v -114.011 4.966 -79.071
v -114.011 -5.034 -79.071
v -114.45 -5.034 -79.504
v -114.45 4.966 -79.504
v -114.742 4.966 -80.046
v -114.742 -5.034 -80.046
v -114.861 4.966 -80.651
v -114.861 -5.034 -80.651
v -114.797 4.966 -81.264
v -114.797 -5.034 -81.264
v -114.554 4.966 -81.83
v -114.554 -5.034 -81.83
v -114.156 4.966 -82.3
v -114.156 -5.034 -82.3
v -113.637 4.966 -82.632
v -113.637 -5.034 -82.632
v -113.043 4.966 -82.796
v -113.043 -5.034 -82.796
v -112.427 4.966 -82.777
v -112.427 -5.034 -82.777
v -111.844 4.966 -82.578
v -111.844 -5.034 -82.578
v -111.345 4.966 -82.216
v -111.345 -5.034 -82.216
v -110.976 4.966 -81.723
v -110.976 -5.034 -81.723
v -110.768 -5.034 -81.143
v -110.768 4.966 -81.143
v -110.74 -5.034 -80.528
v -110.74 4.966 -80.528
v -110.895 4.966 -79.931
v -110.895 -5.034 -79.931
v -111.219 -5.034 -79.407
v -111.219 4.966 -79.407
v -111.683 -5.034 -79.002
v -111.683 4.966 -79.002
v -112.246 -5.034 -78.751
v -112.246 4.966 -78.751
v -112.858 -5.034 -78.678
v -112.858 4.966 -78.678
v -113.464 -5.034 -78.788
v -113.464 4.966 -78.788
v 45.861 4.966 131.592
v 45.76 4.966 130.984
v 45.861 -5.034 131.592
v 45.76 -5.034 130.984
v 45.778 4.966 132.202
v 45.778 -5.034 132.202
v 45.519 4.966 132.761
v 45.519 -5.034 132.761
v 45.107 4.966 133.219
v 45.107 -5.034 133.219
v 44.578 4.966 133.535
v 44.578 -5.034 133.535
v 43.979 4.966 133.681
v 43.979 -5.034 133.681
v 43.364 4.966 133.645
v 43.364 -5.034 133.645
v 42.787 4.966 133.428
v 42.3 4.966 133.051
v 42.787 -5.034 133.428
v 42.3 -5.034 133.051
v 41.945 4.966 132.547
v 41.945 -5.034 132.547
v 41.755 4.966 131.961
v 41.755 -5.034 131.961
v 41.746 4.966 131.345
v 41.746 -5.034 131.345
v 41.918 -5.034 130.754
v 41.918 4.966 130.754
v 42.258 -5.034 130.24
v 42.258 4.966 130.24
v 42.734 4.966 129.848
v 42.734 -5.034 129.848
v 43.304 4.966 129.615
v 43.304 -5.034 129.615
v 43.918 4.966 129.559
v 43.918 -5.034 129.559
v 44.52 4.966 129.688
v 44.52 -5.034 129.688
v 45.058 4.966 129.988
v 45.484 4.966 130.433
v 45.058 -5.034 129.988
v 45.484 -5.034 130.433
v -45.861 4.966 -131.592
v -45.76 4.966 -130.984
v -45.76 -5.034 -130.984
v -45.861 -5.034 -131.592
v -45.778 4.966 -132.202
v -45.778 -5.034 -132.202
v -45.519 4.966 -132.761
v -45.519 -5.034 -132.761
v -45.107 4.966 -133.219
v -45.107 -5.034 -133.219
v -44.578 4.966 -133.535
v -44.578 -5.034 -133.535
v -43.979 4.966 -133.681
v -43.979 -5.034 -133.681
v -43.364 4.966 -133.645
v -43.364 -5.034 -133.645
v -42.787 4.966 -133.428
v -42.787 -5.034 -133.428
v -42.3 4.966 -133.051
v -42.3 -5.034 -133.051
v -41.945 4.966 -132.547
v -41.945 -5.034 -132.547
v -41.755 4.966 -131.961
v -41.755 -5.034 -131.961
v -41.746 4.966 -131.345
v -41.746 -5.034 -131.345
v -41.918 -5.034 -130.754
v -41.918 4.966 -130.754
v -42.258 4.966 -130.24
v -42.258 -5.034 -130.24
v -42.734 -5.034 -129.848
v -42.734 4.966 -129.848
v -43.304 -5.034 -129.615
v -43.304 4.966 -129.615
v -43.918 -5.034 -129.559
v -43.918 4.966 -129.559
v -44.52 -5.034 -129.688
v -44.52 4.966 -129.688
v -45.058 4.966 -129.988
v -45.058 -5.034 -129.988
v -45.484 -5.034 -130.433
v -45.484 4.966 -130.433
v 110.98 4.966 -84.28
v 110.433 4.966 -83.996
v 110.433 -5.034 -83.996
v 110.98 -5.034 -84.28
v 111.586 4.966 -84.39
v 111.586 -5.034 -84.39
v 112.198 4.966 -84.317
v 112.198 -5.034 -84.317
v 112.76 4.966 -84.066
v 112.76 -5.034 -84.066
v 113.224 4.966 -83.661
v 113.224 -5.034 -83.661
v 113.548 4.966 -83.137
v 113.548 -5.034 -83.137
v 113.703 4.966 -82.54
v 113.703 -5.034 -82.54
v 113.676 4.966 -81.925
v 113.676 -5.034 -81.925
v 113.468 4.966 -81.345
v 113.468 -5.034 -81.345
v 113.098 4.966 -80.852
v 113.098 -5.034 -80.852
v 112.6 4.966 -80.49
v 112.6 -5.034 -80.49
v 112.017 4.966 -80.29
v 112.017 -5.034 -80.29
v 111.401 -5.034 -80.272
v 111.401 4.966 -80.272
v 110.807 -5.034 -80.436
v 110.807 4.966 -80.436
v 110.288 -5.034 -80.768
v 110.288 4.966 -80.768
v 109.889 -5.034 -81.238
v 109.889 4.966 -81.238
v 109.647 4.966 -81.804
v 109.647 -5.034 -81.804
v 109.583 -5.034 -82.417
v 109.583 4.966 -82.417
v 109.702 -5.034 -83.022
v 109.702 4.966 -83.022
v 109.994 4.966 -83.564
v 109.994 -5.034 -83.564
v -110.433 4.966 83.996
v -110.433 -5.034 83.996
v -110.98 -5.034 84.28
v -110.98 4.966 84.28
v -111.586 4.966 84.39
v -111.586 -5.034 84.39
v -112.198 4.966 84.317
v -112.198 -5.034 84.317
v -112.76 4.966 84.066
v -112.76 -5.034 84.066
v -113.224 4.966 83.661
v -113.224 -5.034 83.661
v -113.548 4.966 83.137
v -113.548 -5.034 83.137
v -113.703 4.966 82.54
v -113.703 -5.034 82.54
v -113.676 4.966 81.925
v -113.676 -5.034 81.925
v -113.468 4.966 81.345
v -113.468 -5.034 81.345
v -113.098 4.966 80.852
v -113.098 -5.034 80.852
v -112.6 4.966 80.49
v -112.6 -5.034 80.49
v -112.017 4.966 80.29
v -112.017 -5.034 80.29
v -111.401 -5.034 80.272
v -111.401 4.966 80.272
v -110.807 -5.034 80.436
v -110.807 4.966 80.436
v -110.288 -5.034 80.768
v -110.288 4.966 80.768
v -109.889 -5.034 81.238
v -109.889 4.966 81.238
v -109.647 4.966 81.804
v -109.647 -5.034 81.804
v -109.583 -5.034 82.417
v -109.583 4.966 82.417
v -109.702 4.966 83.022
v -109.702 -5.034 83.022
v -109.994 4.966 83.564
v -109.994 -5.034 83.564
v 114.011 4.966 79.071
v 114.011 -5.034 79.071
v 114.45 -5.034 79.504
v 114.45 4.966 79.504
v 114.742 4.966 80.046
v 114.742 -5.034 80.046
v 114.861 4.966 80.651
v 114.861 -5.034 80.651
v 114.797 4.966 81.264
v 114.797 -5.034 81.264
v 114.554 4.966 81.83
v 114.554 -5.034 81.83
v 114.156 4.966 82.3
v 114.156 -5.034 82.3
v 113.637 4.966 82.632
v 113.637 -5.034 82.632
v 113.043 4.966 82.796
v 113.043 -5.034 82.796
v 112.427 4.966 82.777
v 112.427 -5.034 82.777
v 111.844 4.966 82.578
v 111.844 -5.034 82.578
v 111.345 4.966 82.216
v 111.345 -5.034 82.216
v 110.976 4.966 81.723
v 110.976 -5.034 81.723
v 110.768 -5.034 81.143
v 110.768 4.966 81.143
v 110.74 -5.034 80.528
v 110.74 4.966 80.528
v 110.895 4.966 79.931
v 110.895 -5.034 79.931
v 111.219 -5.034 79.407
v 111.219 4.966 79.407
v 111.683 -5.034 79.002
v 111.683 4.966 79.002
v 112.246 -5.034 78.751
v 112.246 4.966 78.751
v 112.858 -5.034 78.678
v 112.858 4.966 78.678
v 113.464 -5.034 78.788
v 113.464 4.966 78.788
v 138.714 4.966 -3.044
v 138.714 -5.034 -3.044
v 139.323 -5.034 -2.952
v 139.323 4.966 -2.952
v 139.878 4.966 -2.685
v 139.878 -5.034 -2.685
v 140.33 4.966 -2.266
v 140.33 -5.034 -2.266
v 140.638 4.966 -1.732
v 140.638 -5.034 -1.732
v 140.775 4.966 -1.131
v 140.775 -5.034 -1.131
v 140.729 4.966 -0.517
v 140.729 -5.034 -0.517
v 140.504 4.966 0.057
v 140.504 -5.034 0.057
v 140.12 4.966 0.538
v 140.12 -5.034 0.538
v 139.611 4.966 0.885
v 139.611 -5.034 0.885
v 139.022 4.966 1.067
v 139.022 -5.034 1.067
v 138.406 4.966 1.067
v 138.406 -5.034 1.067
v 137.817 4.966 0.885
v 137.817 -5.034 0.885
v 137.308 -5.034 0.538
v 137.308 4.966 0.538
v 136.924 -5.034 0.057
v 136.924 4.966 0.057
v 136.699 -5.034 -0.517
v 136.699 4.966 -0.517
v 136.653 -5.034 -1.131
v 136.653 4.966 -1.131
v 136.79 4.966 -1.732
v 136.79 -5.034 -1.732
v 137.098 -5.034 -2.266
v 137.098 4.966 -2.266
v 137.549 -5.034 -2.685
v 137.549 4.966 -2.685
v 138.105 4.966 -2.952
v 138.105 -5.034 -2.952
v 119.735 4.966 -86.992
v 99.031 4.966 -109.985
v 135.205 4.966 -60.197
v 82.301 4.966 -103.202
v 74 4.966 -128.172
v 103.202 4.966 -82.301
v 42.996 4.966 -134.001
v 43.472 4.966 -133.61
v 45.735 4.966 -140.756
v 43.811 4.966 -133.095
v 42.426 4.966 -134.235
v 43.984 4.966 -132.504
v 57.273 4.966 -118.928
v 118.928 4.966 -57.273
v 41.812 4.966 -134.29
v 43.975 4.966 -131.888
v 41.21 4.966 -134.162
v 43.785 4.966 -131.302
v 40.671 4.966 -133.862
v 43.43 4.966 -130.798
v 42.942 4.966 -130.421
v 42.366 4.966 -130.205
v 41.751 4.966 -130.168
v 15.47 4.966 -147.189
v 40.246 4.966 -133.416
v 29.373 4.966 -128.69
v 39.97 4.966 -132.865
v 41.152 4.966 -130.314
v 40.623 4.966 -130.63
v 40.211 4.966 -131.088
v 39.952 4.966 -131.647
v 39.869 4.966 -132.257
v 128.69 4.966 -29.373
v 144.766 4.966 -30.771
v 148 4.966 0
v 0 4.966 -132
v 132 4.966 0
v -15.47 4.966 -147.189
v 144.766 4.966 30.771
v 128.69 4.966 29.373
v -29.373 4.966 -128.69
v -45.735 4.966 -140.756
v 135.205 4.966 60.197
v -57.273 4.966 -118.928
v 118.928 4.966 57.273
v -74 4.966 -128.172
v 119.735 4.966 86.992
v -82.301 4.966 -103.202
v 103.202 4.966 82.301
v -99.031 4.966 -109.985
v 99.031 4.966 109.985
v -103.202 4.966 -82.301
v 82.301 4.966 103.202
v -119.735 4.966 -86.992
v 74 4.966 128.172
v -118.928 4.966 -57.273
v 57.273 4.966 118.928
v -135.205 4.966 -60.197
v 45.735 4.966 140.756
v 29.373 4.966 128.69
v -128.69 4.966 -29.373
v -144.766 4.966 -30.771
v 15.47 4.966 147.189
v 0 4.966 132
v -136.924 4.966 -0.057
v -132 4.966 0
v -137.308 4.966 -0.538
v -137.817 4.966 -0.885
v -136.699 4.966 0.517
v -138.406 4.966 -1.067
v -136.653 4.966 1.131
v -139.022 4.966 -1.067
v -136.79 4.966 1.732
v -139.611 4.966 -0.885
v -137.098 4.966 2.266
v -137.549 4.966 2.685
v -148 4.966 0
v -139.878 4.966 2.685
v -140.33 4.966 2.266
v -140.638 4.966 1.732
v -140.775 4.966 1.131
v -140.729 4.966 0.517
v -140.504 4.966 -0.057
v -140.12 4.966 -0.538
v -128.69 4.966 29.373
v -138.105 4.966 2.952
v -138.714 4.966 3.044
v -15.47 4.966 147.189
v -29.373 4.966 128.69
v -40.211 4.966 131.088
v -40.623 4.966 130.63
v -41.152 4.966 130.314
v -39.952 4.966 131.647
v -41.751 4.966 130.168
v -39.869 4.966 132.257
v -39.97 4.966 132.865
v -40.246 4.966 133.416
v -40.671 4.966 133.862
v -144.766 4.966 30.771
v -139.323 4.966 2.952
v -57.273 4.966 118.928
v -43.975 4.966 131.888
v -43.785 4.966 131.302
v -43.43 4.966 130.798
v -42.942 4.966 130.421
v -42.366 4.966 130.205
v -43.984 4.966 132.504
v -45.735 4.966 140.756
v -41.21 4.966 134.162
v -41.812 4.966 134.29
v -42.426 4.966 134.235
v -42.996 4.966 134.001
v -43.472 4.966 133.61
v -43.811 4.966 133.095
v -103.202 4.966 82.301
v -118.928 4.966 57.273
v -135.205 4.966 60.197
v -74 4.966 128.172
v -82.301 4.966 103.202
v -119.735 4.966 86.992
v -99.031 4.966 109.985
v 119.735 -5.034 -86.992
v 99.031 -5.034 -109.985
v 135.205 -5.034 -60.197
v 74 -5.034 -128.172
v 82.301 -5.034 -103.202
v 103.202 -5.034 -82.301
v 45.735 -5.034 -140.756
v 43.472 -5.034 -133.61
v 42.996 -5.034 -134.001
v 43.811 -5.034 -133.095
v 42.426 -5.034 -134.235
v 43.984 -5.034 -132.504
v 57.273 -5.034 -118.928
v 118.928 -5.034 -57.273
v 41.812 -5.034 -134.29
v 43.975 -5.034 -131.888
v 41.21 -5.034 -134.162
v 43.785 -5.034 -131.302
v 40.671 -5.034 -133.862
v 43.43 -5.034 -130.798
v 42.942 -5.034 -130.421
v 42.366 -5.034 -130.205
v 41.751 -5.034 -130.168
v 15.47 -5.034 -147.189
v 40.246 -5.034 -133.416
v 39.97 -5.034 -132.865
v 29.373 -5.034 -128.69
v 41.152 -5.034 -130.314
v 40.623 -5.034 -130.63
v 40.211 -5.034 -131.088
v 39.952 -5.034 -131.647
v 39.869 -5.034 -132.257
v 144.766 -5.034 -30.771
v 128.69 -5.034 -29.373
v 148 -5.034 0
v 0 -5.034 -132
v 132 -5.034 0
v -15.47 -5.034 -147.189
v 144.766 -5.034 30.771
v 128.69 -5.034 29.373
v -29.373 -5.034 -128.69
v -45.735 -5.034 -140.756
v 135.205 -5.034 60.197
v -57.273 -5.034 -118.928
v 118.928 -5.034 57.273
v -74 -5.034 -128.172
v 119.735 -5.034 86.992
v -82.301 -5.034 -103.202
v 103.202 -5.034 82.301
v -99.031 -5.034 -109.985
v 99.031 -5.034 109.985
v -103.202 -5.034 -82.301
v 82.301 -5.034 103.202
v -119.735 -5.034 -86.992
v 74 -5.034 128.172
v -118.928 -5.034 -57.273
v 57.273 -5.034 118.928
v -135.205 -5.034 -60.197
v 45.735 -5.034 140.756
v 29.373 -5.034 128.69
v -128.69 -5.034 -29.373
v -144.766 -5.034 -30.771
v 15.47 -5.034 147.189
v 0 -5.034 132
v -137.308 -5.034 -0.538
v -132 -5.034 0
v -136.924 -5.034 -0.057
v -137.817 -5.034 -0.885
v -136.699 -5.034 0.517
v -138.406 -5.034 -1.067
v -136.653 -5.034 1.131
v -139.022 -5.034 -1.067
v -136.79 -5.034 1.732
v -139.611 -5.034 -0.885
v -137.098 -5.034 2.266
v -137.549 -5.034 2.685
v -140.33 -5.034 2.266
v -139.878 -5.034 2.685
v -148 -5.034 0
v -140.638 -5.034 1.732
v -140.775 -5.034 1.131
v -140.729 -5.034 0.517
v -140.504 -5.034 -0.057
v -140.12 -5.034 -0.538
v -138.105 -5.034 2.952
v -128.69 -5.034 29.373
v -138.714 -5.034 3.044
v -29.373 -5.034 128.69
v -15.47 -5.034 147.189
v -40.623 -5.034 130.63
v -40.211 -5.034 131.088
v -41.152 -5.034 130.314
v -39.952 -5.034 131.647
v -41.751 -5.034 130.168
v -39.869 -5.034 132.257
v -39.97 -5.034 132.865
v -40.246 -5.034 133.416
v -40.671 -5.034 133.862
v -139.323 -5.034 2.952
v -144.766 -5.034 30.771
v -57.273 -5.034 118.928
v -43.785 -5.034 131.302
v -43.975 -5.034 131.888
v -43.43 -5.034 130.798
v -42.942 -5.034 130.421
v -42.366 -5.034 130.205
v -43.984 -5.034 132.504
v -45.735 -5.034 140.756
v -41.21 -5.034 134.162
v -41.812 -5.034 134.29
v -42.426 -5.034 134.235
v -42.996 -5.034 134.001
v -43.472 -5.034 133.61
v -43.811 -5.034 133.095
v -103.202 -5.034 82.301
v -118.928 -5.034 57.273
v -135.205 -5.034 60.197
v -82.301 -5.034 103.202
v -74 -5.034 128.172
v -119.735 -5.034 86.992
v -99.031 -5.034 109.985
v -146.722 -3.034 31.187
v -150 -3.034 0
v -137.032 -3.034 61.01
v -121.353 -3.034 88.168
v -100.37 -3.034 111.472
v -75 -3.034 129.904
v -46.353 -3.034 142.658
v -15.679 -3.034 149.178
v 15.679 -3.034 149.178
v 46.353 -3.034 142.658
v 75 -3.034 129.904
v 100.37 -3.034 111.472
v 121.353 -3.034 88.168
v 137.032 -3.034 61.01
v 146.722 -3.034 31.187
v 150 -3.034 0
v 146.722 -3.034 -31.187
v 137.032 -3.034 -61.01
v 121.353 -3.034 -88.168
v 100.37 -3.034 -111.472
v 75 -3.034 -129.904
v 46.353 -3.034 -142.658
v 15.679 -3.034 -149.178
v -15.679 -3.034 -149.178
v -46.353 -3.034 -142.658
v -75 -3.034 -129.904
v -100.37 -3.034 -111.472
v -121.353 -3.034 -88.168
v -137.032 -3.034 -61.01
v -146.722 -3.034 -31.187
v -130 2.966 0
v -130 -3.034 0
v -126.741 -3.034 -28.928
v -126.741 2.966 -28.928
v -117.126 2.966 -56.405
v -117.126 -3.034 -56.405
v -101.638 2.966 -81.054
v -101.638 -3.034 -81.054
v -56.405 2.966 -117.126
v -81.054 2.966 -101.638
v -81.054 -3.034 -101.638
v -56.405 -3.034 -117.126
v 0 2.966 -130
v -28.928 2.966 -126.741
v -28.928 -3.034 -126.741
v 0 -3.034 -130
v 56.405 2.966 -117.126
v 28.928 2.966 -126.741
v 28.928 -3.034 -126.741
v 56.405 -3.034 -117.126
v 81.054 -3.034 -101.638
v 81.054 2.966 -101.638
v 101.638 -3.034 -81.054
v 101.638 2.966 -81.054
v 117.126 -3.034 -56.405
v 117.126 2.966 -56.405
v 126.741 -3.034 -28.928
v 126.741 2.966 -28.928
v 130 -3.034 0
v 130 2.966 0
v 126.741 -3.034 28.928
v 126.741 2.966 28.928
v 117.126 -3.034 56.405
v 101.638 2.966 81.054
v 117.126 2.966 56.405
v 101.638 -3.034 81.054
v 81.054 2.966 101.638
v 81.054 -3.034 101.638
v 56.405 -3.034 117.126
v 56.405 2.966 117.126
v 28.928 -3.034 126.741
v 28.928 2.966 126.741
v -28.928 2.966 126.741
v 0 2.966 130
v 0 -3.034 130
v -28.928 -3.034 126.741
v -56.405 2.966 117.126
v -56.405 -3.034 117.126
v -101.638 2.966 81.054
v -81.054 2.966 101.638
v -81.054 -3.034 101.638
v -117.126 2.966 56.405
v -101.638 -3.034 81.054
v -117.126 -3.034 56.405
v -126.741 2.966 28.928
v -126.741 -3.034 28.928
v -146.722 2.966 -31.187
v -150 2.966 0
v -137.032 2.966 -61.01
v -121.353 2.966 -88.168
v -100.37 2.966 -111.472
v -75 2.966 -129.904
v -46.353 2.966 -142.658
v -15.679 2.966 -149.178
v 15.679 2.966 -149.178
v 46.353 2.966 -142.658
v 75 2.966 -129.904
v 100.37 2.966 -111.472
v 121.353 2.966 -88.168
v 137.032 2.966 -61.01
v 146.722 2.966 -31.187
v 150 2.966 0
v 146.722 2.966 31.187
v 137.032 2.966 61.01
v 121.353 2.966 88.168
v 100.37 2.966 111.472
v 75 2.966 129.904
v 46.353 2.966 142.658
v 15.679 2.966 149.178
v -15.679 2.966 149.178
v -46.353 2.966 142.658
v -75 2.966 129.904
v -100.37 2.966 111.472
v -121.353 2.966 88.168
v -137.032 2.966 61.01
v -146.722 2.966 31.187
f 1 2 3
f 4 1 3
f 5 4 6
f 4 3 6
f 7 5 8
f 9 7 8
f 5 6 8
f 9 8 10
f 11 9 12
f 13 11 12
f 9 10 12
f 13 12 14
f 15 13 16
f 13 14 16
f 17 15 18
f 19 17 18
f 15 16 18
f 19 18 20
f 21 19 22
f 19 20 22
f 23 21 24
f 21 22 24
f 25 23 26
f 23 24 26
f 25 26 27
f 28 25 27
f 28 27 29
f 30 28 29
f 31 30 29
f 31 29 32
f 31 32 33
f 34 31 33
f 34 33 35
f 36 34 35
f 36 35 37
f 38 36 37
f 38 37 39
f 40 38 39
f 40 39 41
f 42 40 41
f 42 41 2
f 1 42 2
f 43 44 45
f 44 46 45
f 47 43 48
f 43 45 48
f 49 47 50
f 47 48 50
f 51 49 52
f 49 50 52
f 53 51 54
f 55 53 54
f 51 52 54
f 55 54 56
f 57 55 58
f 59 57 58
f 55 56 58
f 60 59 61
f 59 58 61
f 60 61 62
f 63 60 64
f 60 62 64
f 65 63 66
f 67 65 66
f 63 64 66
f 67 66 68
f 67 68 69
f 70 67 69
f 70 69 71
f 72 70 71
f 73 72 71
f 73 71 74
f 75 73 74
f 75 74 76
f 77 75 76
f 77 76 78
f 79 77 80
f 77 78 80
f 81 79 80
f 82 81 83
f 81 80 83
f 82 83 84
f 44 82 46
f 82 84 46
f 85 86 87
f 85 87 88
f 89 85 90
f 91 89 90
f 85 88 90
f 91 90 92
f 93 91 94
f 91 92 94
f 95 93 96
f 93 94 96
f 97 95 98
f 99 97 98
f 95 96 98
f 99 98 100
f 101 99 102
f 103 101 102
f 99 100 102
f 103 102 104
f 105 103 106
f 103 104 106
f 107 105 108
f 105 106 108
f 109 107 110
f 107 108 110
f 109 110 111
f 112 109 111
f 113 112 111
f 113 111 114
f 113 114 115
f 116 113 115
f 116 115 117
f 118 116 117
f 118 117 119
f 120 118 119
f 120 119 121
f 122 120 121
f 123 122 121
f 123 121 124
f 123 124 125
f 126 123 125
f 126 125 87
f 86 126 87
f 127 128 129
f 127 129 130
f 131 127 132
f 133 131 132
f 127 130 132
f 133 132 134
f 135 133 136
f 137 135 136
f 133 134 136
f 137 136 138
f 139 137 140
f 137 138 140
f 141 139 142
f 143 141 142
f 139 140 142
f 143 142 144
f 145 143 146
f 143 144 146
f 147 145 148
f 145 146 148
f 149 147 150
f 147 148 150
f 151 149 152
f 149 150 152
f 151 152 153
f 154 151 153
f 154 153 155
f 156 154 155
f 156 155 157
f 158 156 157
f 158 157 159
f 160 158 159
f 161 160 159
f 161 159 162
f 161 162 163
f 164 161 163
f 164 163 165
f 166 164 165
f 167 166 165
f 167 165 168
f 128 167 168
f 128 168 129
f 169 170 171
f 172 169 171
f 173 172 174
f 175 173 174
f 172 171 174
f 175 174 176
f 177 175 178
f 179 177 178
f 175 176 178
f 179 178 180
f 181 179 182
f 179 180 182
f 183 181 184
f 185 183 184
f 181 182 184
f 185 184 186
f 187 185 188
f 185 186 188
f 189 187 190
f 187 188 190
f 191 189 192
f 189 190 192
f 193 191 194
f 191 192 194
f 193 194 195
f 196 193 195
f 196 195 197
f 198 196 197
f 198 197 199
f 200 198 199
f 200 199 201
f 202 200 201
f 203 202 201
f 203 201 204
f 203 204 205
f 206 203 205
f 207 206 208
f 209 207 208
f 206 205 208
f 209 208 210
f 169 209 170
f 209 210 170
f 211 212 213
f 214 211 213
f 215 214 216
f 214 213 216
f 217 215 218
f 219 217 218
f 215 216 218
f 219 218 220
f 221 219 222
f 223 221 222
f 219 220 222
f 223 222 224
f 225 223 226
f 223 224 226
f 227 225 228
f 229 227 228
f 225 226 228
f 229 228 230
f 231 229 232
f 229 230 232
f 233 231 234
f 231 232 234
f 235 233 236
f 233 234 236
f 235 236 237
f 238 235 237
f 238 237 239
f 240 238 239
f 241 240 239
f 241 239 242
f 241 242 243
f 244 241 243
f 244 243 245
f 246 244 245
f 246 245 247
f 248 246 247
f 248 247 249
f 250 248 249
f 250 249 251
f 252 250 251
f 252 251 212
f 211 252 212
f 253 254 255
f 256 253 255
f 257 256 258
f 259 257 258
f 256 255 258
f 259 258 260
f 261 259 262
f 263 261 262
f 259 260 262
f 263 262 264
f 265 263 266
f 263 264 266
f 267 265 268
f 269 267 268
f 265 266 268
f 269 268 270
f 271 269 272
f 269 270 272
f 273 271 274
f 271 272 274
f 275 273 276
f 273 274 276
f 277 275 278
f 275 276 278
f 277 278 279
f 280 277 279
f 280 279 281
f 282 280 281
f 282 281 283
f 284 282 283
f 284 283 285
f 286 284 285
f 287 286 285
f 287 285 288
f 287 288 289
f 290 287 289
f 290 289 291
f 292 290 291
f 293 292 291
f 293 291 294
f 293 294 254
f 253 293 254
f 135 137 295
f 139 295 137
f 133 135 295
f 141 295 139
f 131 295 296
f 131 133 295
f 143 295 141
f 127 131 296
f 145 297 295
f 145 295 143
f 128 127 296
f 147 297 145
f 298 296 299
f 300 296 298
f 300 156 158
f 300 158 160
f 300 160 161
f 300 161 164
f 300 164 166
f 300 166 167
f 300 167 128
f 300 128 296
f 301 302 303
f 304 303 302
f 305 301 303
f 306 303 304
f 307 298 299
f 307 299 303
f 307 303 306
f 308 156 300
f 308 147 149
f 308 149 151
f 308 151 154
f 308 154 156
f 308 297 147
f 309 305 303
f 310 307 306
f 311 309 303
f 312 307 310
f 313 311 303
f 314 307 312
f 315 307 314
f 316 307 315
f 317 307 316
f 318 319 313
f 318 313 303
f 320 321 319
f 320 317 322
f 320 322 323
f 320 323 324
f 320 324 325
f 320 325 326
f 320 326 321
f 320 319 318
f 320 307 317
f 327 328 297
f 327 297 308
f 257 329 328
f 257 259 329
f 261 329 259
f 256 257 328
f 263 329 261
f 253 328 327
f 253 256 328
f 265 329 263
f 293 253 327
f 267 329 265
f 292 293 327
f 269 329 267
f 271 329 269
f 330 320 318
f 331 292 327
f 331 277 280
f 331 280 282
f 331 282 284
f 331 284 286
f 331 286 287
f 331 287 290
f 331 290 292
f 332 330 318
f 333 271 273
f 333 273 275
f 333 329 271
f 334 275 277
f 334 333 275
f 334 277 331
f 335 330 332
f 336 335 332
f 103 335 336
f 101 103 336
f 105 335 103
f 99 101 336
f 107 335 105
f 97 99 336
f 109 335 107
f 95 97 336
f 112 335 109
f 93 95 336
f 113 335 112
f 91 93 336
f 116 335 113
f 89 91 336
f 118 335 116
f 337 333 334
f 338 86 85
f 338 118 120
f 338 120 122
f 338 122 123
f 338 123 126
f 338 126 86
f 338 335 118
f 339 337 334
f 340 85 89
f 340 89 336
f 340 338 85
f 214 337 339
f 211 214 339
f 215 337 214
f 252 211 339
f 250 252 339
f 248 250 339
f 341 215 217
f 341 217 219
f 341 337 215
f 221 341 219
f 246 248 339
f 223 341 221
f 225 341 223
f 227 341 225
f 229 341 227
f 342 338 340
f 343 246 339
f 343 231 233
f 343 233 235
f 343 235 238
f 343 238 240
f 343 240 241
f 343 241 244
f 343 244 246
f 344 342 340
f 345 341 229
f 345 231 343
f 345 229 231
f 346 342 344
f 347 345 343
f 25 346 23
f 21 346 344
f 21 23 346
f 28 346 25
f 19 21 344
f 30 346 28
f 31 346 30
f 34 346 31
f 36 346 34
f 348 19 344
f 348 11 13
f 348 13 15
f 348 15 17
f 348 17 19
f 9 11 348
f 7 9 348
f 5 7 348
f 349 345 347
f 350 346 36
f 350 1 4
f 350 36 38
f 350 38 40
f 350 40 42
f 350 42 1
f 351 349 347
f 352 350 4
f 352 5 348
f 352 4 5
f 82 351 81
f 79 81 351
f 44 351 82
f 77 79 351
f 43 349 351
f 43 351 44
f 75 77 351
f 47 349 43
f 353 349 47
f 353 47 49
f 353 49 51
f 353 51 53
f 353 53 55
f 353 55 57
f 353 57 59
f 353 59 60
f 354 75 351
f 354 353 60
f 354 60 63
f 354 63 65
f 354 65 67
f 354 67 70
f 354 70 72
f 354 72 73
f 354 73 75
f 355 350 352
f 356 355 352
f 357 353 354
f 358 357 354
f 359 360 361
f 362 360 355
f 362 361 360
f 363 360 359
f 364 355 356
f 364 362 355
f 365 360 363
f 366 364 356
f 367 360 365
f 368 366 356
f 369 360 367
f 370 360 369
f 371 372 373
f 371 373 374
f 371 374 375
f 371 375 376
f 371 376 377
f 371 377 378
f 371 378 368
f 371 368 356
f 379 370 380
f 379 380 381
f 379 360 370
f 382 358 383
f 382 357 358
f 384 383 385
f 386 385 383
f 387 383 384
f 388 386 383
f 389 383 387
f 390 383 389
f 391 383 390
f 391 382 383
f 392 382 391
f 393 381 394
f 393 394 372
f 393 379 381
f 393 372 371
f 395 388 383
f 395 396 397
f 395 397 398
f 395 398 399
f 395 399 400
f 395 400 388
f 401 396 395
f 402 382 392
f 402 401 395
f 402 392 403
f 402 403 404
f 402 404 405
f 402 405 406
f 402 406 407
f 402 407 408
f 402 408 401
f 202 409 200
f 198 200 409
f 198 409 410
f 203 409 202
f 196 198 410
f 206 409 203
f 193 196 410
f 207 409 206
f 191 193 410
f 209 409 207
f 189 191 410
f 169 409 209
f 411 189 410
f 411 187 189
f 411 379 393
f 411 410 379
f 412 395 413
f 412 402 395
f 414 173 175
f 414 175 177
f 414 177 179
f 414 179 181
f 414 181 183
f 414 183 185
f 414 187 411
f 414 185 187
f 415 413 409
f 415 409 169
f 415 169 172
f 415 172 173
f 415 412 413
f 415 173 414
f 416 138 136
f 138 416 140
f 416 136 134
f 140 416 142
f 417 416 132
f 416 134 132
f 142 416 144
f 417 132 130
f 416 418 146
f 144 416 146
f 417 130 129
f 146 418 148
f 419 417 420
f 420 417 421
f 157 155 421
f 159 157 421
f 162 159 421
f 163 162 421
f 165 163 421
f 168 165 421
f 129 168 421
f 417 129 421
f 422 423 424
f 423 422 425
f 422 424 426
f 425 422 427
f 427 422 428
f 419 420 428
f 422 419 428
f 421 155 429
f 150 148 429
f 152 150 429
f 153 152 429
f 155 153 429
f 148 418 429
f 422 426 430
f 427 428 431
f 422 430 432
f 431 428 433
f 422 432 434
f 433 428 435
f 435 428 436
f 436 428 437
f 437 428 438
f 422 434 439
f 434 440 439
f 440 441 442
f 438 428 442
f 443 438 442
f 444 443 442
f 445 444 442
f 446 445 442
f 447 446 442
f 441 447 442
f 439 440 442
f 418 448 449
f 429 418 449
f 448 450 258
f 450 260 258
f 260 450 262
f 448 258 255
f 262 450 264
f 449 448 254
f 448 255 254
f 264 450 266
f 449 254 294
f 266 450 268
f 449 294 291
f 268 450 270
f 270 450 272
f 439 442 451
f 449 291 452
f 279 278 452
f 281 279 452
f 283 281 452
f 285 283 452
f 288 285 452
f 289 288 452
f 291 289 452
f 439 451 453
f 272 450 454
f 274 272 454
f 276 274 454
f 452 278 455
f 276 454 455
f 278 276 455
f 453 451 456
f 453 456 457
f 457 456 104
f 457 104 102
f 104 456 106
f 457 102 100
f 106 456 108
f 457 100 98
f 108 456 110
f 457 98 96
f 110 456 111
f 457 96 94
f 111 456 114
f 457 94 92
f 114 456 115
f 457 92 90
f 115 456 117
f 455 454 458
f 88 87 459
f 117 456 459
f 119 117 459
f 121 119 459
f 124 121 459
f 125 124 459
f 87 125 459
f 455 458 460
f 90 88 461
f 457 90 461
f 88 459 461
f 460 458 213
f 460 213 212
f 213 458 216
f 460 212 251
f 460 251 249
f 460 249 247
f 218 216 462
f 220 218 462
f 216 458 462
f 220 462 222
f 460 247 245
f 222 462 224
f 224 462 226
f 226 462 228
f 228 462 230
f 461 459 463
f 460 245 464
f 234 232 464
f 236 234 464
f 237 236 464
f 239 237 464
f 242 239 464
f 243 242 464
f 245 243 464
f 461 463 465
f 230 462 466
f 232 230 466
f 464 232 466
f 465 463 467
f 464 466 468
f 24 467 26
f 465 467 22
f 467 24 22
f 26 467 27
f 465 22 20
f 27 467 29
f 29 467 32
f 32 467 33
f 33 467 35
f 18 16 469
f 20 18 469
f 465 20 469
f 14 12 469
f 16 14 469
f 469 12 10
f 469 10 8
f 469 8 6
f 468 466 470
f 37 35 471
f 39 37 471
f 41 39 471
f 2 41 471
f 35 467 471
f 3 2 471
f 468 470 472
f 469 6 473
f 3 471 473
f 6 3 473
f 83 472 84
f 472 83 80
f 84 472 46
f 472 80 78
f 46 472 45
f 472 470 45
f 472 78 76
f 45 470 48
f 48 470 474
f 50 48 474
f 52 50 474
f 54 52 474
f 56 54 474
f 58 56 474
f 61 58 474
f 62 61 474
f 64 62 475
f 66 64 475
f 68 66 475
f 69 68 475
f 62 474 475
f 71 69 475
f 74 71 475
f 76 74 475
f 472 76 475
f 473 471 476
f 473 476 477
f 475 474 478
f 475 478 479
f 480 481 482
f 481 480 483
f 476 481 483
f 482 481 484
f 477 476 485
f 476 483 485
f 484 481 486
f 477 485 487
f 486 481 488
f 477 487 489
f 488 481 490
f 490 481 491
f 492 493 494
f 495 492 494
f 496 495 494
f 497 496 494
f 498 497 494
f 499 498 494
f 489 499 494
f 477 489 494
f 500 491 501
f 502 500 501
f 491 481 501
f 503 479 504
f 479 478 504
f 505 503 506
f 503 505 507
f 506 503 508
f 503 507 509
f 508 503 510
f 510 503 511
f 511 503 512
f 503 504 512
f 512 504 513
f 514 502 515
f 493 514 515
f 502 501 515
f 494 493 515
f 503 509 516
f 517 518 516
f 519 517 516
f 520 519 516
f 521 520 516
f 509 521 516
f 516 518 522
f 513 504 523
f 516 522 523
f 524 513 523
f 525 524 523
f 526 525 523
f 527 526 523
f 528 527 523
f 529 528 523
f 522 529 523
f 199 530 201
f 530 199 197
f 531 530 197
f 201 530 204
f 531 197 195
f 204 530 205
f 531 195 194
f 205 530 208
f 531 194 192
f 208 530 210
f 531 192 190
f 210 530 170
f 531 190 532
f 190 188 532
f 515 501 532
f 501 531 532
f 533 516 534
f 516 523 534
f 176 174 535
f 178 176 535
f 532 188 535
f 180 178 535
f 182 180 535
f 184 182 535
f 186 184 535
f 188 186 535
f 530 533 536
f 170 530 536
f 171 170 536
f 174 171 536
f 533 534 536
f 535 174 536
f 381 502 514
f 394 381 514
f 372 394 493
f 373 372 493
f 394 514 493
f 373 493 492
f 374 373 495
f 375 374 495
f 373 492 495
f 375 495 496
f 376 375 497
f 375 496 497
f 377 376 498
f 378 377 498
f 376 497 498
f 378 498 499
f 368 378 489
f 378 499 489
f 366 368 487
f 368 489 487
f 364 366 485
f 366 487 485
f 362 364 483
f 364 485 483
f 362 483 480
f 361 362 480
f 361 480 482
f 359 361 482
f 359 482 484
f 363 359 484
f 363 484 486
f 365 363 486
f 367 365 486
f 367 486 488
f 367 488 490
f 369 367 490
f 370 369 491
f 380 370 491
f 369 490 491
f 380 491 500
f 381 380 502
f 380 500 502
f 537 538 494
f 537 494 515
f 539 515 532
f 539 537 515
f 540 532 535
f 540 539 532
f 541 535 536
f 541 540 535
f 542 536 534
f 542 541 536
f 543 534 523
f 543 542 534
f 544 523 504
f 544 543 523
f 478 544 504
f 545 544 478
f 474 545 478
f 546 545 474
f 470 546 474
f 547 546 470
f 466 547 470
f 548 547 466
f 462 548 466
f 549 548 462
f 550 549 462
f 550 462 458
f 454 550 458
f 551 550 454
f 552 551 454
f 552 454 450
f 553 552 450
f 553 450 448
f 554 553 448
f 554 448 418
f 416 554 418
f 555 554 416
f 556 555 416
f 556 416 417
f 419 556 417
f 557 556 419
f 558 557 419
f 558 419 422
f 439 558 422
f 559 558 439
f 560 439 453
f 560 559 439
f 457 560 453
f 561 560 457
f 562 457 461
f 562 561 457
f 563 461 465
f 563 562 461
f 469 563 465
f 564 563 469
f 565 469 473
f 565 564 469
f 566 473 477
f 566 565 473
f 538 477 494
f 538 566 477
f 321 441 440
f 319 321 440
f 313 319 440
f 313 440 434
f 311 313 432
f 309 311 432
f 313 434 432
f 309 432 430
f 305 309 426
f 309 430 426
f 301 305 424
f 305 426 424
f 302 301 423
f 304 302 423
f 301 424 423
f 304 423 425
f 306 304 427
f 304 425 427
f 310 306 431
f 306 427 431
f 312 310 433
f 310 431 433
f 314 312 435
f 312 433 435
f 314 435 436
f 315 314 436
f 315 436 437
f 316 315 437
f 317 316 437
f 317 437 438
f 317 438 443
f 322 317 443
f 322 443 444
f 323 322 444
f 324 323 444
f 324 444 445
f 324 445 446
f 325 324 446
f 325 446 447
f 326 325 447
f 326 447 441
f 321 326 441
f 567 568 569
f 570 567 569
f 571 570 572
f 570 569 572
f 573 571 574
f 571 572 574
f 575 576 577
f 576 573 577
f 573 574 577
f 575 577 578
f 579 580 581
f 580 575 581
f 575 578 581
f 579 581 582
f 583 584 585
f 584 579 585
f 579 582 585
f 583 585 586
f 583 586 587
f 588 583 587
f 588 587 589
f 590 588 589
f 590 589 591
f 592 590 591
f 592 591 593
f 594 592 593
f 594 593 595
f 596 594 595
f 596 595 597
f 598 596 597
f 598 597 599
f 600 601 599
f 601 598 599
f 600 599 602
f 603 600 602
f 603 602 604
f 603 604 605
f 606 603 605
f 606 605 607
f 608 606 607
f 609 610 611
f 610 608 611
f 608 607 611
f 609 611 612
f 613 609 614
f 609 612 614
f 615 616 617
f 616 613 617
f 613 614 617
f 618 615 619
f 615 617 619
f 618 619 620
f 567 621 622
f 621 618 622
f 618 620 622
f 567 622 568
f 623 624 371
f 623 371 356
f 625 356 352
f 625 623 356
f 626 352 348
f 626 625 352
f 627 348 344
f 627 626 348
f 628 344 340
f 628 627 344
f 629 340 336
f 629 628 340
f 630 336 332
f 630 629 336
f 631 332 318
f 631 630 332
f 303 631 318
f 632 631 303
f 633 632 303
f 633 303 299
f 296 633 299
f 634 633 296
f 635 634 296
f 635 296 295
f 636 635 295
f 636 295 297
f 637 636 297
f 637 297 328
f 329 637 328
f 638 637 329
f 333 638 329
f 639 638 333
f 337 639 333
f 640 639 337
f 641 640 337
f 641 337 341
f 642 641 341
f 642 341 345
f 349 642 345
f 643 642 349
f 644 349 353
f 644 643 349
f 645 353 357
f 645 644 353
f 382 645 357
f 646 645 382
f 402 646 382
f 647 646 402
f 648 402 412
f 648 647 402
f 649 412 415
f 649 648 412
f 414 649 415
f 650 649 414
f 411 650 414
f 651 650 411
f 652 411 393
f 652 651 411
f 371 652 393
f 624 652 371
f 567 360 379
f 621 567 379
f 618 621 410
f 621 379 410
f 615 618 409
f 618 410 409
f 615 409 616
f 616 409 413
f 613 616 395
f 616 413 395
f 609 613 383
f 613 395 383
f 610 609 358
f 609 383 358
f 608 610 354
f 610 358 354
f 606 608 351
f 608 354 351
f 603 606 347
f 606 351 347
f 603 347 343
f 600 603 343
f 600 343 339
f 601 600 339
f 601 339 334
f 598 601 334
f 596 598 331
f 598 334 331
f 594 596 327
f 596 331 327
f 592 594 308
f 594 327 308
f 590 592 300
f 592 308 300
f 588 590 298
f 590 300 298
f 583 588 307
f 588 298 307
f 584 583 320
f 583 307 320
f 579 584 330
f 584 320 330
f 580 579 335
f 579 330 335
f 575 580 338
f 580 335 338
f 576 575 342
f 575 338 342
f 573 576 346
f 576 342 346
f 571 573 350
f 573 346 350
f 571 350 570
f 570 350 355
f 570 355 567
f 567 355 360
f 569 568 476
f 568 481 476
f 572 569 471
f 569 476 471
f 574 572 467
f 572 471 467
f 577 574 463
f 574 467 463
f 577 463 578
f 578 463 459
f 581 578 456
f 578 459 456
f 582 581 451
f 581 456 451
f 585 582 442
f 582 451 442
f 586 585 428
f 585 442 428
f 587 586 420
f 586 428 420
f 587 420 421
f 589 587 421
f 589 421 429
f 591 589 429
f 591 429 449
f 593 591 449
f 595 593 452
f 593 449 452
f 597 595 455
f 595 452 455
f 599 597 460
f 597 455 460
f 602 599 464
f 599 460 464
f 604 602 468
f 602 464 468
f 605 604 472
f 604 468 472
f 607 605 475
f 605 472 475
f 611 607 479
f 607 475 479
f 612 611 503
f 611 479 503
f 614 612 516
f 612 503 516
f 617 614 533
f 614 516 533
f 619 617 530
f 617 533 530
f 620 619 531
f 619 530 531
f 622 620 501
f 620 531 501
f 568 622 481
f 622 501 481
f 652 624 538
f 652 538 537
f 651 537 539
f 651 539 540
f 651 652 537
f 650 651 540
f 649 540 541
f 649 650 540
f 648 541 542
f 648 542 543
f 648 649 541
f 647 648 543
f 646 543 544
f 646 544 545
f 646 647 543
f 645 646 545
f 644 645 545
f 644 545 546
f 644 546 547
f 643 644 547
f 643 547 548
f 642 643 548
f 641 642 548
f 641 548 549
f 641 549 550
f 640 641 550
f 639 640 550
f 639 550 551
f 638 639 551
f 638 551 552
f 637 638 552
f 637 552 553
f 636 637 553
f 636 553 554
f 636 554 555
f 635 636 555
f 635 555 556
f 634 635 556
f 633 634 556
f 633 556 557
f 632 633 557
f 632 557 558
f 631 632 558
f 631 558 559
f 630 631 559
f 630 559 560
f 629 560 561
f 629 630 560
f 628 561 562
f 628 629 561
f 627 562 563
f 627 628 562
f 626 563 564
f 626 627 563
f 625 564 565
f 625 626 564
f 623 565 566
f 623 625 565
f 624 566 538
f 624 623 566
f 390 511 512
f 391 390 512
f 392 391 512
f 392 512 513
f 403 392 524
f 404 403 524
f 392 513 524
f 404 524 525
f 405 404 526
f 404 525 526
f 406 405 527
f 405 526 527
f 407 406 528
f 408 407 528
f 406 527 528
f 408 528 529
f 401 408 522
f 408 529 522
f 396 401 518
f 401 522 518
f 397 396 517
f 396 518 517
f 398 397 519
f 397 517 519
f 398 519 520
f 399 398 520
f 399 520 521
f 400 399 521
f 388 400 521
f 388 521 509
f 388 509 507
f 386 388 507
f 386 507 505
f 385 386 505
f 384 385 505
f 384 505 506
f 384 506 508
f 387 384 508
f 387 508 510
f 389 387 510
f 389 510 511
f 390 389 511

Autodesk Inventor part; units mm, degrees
ref_plane "YZ Plane" through (0, 0, 0) normal (1, 0, 0) x (0, 1, 0)
ref_plane "XZ Plane" through (0, 0, 0) normal (0, 1, 0) x (-1, 0, 0)
ref_plane "XY Plane" through (0, 0, 0) normal (0, 0, 1) x (1, 0, 0)
sketch "Boceto1" plane through (0, 0, 0) normal (0, 0, 1) x (1, 0, 0)
  line L0 (-150, 4.9659) -> (-130, 4.9659)
  line L1 (-130, 4.9659) -> (-130, -5.0341)
  line L2 (-130, -5.0341) -> (-150, -5.0341)
  line L3 (-150, -5.0341) -> (-150, 4.9659)
  line L4 (0, 0) -> (0, 54.3262)
  dimension "d0" = 20
  dimension "d1" = 10
  dimension "d2" = 150
revolve "Revolución1" add sketch "Boceto1" angle 360 about axis through (0, 0, 0) along (0, 1, 0)
chamfer "Chaflán1" distance 2 angle 45 4 edges at (150, 4.9659, 0) (130, 4.9659, 0) (150, -5.0341, 0) (130, -5.0341, 0)
sketch "Boceto2" plane through (0, 4.9659, 0) normal (0, 1, 0) x (1, 0, 0)
  point P0 (0, 0)
  point P1 (-138.7138, -0.9769)
hole "Agujero1" at (-138.7138, 4.9659, 0.9769) direction (0, -1, 0) diameter 4.134 end through all thread size "M5x0.8" class "6H" standard "ISO Metric profile"
pattern_circular "Patrón circular1" count 10 over 360 about axis through (0, -10, 0) along (0, 1, 0) of "Agujero1"
equation "\"d12\" = Grosor"
equation "\"Radio_pliegue\" = Grosor"
equation "\"Anchura_desahogo_plegado\" = Grosor"
equation "\"Profundidad_desahogo_plegado\" = 0.5 * Grosor"
equation "\"Tamaño_destalonado\" = 4 * Grosor"
equation "\"Remanente_mínimo\" = 2 * Grosor"
equation "\"Radiodetransición\" = Radio_pliegue"
equation "\"Tamaño_de_radio_de_Jacobi\" = Radio_pliegue"
equation "\"TamañoSeparación\" = Grosor"
equation "\"Grosor\" = 0.5"
